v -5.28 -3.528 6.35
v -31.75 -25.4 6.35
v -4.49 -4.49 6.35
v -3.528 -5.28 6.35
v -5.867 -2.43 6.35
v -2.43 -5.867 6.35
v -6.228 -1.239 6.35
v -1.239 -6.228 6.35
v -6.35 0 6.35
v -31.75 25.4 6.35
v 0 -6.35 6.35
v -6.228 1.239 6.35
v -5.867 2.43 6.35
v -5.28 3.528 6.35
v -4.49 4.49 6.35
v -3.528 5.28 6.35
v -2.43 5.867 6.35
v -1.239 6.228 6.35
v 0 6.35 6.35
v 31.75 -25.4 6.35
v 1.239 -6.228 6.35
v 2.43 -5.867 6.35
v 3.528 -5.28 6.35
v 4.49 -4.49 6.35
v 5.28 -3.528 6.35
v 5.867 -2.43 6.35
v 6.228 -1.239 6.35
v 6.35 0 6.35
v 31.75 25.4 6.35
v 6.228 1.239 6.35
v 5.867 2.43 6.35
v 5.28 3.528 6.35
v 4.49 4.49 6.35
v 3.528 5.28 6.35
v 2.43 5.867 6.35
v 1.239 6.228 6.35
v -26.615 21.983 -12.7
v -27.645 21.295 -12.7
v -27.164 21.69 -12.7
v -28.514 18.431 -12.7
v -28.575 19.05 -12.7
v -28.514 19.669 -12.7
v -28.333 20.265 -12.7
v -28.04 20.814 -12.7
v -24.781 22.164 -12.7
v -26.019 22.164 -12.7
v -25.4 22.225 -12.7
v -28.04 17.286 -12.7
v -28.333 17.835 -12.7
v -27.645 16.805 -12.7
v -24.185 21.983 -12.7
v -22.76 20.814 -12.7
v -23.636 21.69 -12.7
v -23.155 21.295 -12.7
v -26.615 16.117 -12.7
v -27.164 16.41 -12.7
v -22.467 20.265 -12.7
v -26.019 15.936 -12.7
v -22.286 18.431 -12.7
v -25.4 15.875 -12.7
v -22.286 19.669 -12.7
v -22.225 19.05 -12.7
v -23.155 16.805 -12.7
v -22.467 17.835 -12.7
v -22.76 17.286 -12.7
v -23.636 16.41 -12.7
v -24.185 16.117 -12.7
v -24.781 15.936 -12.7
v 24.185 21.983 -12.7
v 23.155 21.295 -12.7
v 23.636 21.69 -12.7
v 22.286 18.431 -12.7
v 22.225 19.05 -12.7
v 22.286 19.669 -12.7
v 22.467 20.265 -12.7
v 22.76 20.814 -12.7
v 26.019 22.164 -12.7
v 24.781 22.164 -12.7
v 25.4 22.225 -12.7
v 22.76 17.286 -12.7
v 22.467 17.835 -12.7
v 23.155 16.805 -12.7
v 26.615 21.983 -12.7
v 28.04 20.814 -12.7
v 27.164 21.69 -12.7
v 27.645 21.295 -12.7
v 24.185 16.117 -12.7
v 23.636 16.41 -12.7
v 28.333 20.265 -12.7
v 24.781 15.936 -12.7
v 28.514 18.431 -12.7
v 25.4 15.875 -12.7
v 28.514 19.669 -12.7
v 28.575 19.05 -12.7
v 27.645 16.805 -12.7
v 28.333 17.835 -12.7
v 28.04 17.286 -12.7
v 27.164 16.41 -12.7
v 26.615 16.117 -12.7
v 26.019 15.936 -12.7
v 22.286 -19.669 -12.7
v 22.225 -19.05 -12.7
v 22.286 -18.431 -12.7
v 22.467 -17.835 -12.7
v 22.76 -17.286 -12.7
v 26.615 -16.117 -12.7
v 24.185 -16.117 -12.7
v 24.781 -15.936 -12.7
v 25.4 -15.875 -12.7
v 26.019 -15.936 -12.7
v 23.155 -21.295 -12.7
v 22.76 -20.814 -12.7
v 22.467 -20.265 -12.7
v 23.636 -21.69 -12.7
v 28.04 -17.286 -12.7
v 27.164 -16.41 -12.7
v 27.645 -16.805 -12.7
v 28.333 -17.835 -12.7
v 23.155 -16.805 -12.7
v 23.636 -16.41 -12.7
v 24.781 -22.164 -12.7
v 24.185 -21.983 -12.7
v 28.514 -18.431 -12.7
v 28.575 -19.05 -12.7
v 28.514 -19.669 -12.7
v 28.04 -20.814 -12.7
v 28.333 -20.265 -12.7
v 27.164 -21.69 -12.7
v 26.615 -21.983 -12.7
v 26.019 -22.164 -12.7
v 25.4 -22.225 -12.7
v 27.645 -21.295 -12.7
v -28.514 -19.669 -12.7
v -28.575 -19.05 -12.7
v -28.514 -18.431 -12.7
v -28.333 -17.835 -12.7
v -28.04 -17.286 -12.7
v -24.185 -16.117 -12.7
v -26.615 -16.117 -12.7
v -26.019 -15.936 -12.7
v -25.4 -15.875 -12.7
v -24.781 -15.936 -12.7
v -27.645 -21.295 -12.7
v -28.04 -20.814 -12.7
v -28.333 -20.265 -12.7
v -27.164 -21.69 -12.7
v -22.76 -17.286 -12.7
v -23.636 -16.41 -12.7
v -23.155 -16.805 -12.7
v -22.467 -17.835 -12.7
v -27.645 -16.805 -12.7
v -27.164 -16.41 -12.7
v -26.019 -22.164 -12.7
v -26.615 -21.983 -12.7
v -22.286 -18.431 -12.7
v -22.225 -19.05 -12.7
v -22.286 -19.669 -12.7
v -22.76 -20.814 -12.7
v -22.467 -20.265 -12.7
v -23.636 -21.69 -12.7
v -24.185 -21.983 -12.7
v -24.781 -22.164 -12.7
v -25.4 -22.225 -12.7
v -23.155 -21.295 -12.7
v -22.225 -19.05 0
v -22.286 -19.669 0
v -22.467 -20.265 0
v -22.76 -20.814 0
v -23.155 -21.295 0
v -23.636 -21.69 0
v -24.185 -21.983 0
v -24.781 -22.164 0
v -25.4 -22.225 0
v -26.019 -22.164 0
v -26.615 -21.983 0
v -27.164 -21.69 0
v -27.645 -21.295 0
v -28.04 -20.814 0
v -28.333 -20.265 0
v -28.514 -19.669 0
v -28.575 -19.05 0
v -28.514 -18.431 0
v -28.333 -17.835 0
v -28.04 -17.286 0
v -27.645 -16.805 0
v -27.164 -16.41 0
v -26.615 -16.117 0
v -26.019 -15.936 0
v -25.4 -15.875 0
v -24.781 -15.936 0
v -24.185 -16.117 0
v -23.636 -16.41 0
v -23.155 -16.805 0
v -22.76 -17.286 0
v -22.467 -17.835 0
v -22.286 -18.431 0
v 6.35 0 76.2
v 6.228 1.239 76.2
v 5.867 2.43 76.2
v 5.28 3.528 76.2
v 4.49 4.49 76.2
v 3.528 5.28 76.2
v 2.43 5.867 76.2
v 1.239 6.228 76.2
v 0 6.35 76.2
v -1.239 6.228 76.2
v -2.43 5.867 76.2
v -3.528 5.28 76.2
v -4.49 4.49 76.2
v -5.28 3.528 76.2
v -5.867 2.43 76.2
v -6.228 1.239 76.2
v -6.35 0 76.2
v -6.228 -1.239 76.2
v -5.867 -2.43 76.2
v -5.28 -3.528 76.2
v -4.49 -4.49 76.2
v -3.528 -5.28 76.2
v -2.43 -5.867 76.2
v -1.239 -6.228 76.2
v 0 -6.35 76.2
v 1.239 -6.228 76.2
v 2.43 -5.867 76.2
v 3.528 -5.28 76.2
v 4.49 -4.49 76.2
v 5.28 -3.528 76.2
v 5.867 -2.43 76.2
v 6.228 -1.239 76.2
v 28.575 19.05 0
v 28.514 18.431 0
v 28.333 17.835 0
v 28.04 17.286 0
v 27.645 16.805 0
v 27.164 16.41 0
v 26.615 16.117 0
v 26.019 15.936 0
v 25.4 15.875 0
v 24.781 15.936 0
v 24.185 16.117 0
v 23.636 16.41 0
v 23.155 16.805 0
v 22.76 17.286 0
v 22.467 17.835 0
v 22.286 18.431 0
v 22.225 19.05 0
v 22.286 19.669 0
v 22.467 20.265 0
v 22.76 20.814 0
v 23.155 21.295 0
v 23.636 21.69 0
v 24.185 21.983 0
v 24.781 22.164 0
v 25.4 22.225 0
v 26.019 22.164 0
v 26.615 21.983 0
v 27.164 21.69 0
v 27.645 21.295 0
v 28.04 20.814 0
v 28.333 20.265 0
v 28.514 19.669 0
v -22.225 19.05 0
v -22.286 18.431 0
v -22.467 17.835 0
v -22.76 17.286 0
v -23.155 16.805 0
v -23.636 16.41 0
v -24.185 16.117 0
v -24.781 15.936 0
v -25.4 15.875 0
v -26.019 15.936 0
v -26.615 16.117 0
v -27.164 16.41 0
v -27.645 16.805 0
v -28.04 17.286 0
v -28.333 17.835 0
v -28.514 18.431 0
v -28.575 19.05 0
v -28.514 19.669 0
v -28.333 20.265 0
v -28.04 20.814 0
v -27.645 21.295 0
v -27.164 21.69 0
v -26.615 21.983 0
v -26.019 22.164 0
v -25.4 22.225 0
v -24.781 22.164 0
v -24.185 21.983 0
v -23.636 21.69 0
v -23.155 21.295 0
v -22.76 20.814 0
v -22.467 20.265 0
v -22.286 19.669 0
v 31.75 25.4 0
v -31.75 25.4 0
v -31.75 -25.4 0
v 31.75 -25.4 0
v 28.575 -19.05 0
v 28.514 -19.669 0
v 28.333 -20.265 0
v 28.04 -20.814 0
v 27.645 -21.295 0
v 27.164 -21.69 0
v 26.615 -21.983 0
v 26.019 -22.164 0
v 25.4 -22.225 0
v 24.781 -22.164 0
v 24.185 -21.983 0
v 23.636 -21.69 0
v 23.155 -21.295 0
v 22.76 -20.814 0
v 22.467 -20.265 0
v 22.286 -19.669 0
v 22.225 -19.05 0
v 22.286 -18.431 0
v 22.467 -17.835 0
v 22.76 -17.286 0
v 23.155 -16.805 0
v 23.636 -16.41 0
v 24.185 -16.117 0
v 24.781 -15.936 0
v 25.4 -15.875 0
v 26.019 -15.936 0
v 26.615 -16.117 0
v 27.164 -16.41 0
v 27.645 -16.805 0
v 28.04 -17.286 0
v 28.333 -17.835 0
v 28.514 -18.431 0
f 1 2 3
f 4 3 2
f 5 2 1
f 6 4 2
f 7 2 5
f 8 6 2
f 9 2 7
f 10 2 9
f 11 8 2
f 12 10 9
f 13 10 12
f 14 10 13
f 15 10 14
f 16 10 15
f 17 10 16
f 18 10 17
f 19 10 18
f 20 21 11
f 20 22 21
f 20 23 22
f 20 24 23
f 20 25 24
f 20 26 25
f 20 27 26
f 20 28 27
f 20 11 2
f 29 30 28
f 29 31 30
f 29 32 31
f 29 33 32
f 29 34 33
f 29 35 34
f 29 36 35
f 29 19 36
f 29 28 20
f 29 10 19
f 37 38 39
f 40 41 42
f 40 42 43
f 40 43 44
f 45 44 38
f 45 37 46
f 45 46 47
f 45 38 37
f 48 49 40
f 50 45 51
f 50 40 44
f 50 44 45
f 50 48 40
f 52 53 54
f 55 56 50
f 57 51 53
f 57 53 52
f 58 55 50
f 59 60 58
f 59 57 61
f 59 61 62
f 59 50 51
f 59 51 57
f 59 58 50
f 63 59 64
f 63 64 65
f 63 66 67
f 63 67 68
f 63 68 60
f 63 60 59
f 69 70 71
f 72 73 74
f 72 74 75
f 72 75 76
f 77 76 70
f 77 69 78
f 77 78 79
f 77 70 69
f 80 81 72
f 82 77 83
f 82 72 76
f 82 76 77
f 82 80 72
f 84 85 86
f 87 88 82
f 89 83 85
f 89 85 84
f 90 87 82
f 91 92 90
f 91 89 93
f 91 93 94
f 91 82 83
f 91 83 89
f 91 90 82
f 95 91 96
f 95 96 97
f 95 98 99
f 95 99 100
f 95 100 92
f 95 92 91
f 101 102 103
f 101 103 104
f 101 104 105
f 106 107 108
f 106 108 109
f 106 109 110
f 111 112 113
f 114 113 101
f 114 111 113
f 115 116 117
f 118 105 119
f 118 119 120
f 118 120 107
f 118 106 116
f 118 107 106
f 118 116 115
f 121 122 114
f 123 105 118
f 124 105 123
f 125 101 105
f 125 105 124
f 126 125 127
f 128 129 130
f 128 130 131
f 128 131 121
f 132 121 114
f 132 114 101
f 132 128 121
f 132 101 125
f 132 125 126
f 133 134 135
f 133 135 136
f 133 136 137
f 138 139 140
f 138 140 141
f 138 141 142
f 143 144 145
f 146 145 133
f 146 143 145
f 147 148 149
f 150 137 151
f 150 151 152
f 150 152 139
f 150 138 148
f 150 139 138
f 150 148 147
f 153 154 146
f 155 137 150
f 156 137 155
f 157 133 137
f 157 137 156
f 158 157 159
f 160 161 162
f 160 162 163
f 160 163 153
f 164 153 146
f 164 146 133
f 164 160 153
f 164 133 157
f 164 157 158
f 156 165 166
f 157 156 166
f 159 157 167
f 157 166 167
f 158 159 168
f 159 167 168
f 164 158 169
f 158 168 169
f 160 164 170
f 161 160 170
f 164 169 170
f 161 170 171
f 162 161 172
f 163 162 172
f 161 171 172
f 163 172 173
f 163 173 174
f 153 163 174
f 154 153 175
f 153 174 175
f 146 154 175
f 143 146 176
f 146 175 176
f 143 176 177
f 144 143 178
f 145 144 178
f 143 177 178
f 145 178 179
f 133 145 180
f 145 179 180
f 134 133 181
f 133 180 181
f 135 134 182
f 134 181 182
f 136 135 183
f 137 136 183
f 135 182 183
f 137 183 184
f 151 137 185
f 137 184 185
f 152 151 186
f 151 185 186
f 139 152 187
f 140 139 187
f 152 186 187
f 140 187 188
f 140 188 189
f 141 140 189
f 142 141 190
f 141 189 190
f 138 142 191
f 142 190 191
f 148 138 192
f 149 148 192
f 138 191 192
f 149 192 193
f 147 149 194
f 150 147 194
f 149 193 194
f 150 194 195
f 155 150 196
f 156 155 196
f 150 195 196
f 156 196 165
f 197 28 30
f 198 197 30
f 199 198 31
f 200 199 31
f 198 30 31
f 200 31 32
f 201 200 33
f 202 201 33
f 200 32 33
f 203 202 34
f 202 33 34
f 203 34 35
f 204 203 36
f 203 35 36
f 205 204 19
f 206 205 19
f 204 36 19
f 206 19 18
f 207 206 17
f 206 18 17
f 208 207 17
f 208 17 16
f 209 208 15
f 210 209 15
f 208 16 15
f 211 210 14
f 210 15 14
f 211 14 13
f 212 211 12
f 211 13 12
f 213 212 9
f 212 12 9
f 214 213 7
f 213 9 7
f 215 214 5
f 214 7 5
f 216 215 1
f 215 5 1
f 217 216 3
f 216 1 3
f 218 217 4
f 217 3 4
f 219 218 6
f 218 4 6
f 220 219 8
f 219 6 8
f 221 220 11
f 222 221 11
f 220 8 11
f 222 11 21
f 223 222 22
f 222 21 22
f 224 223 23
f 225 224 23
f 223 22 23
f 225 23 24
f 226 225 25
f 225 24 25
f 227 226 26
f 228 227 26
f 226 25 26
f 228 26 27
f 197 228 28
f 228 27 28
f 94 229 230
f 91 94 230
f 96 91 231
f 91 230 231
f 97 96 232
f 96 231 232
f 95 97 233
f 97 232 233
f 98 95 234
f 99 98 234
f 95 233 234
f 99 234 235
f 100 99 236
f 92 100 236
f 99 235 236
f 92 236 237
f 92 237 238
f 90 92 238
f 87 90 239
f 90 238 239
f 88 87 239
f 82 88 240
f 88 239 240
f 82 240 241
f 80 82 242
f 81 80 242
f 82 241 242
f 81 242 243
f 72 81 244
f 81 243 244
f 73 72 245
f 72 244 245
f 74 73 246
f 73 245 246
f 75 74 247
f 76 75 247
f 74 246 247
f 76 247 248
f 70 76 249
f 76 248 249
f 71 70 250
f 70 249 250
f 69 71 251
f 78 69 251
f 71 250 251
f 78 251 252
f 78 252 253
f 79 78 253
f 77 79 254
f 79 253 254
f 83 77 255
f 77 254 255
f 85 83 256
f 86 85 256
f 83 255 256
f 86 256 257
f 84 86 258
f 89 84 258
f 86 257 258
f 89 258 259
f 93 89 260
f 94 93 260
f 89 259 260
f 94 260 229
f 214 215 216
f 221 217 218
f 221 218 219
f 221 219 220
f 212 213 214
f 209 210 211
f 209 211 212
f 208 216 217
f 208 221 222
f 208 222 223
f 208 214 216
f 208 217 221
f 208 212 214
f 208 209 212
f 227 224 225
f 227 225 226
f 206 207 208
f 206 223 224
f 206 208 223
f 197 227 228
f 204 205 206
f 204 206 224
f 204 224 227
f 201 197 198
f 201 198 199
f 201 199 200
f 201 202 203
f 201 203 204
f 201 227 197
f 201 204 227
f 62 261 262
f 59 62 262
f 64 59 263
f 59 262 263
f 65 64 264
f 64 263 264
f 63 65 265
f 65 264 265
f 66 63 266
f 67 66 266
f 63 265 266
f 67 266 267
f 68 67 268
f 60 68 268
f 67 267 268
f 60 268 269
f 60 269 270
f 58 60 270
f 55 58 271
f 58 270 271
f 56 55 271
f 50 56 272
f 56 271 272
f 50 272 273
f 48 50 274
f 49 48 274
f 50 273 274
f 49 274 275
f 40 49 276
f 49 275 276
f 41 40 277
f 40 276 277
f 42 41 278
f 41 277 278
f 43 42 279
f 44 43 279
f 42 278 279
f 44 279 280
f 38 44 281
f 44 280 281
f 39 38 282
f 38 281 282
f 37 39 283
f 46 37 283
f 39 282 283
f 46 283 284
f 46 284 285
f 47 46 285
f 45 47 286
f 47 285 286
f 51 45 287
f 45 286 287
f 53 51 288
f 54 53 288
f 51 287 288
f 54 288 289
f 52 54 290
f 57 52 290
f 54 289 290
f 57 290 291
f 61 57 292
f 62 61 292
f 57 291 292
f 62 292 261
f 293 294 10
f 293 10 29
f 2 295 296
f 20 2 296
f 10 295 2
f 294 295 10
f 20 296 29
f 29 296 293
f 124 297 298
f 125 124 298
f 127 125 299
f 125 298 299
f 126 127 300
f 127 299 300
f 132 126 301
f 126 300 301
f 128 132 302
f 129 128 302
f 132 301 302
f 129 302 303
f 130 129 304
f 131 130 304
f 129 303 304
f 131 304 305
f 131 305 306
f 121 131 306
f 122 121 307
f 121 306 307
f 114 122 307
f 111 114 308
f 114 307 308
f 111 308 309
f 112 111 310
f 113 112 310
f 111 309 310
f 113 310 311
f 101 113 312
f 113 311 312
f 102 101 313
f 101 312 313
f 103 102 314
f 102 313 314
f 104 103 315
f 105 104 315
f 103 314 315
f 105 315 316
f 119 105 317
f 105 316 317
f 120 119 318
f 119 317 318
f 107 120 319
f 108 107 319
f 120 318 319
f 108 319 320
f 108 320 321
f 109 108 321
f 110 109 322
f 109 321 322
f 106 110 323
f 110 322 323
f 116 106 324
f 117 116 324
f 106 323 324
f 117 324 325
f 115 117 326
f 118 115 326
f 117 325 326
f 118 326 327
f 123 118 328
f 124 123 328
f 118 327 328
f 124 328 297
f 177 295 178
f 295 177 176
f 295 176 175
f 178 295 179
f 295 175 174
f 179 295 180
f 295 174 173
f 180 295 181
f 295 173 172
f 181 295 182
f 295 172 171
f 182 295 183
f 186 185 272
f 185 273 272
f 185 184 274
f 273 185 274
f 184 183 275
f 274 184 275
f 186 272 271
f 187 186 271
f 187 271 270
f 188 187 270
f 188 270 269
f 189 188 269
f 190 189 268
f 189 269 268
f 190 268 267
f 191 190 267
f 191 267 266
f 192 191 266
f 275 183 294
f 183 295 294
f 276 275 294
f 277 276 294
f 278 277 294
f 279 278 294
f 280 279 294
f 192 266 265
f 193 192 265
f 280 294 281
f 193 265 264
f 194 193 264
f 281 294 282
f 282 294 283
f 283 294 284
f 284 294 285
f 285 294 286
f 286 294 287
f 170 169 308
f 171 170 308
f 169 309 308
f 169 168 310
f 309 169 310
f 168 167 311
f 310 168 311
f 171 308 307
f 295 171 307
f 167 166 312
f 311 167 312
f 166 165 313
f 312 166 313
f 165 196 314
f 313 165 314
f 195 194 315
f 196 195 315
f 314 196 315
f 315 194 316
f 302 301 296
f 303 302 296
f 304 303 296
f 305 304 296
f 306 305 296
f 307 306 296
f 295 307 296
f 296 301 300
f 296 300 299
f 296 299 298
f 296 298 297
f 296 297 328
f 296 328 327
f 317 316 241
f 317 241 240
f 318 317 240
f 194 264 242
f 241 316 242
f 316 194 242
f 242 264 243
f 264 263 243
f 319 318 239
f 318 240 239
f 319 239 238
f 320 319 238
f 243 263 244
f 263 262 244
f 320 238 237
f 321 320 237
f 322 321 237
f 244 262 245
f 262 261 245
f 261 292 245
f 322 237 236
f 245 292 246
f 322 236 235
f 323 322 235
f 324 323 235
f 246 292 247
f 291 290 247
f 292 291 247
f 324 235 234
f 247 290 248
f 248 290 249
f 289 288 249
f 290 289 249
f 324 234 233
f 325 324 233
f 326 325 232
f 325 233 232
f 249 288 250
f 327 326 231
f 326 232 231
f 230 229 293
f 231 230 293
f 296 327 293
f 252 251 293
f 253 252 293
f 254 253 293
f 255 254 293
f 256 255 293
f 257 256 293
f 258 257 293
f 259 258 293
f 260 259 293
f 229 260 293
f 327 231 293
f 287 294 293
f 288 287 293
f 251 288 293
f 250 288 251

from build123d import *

# Parameters (mm, degrees)
F0_W     = 63.5
F0_H     = 50.8
F1_DEPTH = 6.35
F2_R     = 6.35
F3_DEPTH = 69.85
F4_R     = 3.175
F5_DEPTH = 12.7


with BuildPart() as f1:
    # F0 (on Top) → F1 (new body)
    with BuildSketch(Plane.XY):
        Rectangle(F0_W, F0_H)
    extrude(amount=F1_DEPTH)

    # F2 (on face) → F3 (join)
    with BuildSketch(Plane.XY.offset(6.35)):
        Circle(F2_R)
    extrude(amount=F3_DEPTH)

    # F4 (on face) → F5 (join)
    with BuildSketch(Plane(origin=(0, 0, 0), x_dir=(1, 0, 0), z_dir=(0, 0, -1))):
        with Locations((-25.4, 19.05)):
            Circle(F4_R)
        with Locations((25.4, 19.05)):
            Circle(F4_R)
        with Locations((-25.4, -19.05)):
            Circle(F4_R)
        with Locations((25.4, -19.05)):
            Circle(F4_R)
    extrude(amount=F5_DEPTH)


solid = f1.part
